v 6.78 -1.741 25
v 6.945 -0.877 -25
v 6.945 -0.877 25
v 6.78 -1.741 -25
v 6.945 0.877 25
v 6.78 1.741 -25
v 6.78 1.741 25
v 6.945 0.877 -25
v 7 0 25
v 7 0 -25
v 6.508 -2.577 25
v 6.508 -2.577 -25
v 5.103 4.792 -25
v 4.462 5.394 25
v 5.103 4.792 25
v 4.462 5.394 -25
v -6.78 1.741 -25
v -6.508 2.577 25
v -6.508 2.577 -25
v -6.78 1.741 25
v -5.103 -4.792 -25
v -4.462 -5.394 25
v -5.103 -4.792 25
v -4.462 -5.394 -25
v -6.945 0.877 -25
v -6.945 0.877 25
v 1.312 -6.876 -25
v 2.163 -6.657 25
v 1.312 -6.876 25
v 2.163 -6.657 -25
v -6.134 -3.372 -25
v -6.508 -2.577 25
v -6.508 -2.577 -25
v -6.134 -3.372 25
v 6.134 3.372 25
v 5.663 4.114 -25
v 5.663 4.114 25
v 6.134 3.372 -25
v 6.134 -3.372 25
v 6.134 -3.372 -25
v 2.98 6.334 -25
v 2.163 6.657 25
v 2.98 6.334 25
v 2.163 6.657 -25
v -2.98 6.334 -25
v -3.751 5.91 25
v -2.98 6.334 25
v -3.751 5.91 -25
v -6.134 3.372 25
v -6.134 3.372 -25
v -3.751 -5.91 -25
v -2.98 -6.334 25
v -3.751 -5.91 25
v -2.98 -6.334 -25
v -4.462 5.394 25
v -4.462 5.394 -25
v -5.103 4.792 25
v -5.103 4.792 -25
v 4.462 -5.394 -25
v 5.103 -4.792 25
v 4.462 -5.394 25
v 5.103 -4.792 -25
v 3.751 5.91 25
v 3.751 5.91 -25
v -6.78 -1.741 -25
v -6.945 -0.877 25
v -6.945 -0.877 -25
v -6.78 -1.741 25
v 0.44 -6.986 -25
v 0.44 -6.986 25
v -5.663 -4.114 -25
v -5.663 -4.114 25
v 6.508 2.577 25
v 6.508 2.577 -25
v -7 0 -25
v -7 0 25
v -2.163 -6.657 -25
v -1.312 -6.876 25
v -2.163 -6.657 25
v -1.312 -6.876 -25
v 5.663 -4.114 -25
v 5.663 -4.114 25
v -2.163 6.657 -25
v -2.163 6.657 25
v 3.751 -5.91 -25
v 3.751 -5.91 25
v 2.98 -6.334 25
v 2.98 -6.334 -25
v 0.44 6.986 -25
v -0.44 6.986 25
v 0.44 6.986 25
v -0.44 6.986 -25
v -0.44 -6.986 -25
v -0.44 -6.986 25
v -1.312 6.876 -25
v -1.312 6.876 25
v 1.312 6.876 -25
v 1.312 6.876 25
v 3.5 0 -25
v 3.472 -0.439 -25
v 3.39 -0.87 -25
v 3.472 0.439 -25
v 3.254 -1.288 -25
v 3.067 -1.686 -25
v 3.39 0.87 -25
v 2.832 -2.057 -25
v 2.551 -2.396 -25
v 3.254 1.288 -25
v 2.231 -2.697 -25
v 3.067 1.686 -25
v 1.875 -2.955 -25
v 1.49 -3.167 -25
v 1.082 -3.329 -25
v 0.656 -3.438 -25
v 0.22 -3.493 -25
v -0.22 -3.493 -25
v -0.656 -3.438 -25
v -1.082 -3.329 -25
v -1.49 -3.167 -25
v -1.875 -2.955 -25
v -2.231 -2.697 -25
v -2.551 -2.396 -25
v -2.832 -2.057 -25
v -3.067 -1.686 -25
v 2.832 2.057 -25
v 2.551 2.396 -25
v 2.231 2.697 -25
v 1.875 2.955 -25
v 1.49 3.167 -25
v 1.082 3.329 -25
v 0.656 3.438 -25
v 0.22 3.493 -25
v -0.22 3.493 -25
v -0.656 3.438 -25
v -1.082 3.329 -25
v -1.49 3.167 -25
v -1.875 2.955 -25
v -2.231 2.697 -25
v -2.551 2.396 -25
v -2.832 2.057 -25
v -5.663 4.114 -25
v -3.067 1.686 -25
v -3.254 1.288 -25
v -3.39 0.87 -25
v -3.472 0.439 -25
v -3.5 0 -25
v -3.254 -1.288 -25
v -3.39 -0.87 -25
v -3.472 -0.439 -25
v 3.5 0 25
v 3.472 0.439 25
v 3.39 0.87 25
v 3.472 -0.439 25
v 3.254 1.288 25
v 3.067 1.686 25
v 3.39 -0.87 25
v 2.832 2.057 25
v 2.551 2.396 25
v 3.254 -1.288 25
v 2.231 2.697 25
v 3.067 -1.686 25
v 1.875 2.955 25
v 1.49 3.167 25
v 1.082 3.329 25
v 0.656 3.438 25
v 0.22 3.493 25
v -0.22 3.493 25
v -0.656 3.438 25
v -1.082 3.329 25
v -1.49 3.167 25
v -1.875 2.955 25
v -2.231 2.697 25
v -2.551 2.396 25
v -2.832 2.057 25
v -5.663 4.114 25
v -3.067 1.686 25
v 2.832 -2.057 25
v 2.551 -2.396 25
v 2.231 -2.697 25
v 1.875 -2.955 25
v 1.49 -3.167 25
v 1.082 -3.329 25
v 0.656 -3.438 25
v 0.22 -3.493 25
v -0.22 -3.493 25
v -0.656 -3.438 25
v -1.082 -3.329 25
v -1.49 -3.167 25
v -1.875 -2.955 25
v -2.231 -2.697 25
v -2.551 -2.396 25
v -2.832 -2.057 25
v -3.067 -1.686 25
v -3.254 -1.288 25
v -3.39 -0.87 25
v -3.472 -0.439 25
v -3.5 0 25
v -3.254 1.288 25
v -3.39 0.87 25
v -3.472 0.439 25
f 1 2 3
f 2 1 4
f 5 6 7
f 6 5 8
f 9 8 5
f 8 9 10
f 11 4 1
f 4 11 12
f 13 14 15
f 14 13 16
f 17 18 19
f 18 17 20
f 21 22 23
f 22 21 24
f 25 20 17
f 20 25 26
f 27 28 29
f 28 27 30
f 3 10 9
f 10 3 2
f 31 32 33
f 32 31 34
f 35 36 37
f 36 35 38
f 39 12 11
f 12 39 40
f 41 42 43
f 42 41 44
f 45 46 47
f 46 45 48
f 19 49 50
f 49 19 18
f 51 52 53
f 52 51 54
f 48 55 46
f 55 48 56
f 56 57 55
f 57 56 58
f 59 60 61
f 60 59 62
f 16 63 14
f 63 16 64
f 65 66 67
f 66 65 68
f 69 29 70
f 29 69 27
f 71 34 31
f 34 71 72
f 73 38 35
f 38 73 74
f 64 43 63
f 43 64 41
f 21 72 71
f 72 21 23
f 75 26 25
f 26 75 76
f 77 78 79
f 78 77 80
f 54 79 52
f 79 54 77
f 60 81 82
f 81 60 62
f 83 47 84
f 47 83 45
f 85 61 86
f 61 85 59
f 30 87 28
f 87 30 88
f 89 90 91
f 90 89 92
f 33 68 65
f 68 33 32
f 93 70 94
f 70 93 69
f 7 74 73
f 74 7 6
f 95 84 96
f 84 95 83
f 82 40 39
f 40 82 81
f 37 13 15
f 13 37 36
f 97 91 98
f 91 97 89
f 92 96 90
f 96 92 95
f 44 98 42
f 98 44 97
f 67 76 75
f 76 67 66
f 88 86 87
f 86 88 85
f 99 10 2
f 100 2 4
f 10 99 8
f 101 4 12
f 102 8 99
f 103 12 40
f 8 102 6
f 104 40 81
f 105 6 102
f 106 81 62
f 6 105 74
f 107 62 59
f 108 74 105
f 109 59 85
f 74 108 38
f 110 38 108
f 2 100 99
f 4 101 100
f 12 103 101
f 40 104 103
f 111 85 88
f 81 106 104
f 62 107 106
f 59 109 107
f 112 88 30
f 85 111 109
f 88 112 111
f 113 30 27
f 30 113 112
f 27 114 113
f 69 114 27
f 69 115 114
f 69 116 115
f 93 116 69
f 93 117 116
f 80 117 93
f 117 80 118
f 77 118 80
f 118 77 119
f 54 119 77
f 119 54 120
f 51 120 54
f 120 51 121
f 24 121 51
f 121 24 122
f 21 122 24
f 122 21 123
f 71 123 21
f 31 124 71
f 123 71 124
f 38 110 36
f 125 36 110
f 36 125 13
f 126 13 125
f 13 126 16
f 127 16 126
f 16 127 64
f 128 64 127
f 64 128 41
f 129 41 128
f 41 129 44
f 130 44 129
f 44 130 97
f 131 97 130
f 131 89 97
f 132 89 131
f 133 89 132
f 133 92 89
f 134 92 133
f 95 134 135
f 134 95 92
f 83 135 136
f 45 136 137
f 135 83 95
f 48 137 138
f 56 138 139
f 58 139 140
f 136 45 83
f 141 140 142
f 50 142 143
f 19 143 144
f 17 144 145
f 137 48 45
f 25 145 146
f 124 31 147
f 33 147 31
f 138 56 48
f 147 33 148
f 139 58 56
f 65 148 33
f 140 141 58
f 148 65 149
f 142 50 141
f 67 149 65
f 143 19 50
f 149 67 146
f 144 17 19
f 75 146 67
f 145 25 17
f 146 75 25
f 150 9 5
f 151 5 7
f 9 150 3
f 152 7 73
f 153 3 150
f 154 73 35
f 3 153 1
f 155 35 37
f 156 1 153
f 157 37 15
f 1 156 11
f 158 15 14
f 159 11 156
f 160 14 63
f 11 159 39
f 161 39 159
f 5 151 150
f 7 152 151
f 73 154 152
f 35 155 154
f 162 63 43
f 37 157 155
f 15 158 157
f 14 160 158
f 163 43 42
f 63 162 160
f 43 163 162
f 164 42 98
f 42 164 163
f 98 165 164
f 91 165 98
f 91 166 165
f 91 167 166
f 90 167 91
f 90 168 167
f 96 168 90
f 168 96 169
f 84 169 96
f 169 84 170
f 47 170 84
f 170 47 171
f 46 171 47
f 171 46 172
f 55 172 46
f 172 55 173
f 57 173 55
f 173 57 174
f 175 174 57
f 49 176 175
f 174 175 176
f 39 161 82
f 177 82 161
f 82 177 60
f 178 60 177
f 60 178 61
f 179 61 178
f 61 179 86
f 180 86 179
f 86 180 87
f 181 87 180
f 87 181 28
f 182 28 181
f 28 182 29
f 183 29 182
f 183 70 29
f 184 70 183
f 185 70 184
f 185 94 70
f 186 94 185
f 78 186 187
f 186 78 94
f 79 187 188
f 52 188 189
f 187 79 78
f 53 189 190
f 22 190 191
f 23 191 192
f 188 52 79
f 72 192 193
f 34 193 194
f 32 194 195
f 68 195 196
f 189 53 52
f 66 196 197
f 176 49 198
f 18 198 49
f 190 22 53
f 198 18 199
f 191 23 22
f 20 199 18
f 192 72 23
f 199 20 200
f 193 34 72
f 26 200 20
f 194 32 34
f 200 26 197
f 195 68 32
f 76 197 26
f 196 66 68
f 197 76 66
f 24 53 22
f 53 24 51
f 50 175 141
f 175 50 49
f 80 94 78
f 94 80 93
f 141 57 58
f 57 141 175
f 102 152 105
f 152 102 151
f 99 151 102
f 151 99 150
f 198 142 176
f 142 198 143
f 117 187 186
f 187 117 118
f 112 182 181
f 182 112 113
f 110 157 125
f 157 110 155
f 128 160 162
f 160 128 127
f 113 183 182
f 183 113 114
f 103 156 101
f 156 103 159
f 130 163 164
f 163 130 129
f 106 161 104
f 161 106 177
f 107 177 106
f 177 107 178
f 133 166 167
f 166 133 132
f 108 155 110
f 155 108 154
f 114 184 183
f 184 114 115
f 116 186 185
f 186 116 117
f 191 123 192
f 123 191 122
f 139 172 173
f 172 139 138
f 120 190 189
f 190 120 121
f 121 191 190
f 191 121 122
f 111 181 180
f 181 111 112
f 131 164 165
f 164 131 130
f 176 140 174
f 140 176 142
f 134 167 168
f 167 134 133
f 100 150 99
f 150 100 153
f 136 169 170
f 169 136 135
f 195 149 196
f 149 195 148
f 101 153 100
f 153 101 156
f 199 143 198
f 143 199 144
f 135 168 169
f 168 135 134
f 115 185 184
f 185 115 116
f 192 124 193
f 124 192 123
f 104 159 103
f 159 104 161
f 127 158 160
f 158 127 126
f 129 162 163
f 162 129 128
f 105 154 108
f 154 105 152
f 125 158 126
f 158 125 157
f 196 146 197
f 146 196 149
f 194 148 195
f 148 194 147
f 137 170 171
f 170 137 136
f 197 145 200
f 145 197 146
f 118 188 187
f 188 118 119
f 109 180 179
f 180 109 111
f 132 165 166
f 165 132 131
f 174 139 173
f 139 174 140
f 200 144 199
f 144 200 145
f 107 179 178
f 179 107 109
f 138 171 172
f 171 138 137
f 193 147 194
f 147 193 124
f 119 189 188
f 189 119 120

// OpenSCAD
$fn = 50;


difference() {
	union() {
		translate(v = [0, 0, -25.0000000000]) {
			cylinder(h = 50, r = 7.0000000000);
		}
	}
	union() {
		translate(v = [0, 0, -100.0000000000]) {
			cylinder(h = 200, r = 3.5000000000);
		}
	}
}
